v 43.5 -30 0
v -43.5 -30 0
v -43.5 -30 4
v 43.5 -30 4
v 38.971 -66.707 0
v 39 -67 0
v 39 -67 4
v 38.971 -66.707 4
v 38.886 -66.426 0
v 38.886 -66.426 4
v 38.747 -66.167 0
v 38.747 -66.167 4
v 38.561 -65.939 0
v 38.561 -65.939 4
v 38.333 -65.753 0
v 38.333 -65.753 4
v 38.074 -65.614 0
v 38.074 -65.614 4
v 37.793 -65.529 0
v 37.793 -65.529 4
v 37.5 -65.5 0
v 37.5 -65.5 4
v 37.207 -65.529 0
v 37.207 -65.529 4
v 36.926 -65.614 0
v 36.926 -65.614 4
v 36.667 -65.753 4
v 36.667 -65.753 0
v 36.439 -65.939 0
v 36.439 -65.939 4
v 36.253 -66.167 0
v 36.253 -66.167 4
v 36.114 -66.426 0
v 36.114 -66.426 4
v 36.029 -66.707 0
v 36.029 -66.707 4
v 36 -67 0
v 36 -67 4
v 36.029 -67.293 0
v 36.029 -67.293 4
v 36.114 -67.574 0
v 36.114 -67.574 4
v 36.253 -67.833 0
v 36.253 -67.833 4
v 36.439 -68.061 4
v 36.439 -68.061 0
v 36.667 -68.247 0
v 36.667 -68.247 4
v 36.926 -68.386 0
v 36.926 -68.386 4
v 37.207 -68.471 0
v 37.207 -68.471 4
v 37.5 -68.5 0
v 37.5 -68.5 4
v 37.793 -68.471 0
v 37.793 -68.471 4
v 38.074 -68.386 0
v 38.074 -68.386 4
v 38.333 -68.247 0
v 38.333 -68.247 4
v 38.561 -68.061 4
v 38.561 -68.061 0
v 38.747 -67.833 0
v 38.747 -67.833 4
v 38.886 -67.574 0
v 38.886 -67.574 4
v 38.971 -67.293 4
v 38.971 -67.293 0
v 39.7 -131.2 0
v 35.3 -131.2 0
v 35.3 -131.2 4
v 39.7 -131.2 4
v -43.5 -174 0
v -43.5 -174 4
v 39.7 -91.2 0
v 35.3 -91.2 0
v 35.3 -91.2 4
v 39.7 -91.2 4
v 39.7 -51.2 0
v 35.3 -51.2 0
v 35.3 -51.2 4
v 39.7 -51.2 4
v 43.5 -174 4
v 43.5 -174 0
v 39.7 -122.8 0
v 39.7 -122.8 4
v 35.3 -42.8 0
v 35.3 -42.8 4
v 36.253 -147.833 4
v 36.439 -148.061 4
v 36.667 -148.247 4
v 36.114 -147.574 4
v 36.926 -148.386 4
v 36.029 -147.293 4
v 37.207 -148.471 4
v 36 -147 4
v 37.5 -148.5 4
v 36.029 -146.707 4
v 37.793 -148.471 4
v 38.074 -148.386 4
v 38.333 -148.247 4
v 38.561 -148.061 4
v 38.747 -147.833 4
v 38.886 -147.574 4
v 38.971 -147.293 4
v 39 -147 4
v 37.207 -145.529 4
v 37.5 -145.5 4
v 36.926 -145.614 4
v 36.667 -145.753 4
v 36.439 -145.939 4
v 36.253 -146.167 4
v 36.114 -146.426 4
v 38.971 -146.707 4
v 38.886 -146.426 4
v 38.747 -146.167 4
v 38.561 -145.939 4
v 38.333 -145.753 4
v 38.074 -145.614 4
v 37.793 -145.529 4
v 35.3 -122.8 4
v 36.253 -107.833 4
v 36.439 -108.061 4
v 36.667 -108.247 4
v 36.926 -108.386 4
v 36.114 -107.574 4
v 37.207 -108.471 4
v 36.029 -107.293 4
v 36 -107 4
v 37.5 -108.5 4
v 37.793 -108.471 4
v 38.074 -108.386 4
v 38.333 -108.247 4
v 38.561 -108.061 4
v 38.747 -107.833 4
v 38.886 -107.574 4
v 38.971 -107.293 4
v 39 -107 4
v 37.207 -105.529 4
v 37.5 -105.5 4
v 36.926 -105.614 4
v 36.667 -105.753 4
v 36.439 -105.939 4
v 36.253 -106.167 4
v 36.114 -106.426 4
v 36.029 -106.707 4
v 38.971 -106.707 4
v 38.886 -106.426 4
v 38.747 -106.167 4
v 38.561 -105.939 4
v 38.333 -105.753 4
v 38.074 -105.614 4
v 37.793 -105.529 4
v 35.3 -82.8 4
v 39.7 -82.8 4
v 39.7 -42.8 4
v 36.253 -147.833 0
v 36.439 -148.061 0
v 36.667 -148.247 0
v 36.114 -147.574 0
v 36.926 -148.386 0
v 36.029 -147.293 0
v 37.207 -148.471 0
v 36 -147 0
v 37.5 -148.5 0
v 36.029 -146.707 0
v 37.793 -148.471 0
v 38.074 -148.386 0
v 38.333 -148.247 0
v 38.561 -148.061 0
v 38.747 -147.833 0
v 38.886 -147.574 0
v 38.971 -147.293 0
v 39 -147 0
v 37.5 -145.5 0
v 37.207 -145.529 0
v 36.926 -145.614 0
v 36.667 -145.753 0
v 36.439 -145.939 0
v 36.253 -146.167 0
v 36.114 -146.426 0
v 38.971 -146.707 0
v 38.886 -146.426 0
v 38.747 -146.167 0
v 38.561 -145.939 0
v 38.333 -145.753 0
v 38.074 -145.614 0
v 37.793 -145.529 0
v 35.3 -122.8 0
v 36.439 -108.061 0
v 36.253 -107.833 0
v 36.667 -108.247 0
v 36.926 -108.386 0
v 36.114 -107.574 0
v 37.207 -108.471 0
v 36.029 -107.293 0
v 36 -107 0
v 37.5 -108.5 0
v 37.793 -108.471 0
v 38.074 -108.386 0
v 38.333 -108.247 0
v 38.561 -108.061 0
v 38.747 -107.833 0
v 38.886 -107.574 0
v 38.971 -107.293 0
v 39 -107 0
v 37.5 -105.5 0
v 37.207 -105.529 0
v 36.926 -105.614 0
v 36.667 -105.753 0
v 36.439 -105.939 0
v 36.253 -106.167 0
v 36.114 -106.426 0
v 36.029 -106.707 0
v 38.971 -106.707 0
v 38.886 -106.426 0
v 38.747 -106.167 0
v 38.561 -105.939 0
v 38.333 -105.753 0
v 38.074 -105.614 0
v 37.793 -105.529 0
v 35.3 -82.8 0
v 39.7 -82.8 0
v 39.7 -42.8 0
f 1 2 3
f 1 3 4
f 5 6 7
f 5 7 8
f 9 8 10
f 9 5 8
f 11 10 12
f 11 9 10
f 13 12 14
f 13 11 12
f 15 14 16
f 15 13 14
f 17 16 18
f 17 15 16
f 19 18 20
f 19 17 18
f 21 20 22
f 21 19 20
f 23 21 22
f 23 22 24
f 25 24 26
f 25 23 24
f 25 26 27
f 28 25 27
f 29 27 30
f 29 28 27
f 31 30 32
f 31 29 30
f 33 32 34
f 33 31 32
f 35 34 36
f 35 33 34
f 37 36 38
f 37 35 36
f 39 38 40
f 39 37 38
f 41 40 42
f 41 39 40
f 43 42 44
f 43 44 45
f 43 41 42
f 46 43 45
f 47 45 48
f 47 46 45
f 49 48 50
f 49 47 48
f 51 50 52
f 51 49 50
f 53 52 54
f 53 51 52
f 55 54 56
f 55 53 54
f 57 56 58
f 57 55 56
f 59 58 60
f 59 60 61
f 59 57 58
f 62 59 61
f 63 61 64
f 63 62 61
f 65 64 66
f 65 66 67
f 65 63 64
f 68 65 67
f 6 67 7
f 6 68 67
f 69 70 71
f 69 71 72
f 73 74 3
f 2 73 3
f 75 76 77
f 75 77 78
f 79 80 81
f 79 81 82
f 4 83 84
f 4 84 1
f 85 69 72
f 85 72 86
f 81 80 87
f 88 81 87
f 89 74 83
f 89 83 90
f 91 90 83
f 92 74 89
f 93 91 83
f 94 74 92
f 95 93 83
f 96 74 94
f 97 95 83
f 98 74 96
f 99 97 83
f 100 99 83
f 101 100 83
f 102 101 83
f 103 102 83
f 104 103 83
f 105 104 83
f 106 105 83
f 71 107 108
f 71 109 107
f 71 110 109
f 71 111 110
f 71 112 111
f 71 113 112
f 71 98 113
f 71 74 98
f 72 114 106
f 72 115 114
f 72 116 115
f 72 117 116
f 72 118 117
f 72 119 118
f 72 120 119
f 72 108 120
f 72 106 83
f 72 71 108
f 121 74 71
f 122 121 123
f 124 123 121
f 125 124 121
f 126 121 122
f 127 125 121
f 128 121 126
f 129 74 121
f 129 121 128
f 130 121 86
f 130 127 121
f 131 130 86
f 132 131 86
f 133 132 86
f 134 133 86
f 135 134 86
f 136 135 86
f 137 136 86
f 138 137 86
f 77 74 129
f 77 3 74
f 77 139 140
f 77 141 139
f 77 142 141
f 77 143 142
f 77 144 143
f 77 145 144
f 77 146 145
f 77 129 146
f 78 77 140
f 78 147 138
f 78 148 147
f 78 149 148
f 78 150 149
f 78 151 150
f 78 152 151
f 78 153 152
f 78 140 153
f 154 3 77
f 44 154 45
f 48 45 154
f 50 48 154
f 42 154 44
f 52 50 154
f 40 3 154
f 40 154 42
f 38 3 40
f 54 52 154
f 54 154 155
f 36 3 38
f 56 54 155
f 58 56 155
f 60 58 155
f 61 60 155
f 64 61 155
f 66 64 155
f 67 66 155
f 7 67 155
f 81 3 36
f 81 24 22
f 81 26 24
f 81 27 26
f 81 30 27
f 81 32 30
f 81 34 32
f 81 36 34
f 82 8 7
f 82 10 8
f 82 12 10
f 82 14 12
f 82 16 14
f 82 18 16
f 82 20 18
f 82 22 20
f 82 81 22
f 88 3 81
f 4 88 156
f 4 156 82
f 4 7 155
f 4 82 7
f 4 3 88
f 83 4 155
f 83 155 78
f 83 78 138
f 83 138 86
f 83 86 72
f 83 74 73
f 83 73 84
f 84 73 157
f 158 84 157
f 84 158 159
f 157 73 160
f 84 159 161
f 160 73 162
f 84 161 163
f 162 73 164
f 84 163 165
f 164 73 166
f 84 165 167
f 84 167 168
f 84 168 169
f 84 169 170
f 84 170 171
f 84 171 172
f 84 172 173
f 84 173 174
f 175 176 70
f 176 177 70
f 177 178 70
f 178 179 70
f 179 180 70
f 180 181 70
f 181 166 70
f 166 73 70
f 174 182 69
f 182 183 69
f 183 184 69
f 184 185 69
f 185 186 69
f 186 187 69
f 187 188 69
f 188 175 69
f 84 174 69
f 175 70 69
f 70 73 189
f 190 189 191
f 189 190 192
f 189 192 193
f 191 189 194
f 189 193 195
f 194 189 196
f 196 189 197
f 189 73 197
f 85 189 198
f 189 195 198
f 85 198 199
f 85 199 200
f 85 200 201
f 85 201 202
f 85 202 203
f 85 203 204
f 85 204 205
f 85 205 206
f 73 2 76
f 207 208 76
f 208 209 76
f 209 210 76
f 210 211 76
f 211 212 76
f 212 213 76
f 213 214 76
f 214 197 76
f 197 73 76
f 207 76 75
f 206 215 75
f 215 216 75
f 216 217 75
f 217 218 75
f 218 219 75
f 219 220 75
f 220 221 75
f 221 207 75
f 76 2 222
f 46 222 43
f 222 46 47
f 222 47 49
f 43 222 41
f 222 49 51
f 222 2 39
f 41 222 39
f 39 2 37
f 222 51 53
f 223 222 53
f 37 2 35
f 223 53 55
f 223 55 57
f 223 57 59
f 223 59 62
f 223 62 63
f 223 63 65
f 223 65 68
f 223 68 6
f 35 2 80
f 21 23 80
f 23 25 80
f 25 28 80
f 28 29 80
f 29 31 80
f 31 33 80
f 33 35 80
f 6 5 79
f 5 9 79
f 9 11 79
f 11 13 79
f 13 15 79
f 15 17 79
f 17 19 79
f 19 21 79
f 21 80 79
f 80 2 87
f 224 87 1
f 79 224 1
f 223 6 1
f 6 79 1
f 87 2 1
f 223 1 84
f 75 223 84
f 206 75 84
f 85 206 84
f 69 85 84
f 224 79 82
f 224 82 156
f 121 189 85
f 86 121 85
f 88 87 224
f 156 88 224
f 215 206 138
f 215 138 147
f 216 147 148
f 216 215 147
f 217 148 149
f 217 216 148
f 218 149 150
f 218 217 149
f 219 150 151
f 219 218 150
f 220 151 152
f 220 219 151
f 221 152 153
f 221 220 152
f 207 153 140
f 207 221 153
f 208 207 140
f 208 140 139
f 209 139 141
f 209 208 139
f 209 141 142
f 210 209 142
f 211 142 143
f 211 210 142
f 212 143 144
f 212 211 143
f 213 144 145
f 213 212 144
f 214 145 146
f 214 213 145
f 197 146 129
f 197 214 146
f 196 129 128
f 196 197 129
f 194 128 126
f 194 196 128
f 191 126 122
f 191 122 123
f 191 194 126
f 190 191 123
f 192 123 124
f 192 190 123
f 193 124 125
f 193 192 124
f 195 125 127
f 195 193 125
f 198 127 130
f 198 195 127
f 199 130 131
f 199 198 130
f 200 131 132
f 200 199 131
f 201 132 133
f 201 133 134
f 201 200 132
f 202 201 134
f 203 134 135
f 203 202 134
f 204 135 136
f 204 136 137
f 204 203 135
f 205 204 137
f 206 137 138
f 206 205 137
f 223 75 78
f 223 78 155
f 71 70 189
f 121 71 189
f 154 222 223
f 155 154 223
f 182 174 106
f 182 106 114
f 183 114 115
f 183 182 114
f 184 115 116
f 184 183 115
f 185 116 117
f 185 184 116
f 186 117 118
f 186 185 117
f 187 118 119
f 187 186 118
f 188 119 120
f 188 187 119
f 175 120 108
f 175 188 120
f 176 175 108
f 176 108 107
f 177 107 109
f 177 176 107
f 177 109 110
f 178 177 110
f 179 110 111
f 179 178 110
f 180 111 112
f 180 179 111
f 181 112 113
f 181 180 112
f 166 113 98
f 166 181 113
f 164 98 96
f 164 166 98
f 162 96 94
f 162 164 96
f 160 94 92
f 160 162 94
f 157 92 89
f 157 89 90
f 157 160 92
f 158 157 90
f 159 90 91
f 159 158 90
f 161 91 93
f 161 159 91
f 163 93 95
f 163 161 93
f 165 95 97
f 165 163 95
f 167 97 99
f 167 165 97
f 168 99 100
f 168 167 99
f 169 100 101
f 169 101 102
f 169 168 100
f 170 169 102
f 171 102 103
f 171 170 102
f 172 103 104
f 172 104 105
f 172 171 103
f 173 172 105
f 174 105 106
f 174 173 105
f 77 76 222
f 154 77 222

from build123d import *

# Parameters (mm, degrees)
SKETCH_1_R      = 1.5
SKETCH_1_W      = 4.4
SKETCH_1_H      = 8.4
EXTRUDE_1_DEPTH = 4
SKETCH_2_W      = 87
SKETCH_2_H      = 20
EXTRUDE_2_DEPTH = 4


with BuildPart() as part:
    # 草图1 → 凸台-拉伸1 (new body)
    with BuildSketch(Plane.XY):
        Polygon((43.5, -50), (43.5, -150), (43.5, -154), (-43.5, -154), (-43.5, -150), (-43.5, -50), (-43.5, -30), (43.5, -30), align=None)
        with Locations((37.5, -147)):
            Circle(SKETCH_1_R, mode=Mode.SUBTRACT)
        with Locations((37.5, -67)):
            Circle(SKETCH_1_R, mode=Mode.SUBTRACT)
        with Locations((37.5, -107)):
            Circle(SKETCH_1_R, mode=Mode.SUBTRACT)
        with Locations((37.5, -127)):
            Rectangle(SKETCH_1_W, SKETCH_1_H, mode=Mode.SUBTRACT)
        with Locations((37.5, -87)):
            Rectangle(SKETCH_1_W, SKETCH_1_H, mode=Mode.SUBTRACT)
        with Locations((37.5, -47)):
            Rectangle(SKETCH_1_W, SKETCH_1_H, mode=Mode.SUBTRACT)
    extrude(amount=EXTRUDE_1_DEPTH)

    # 草图2 → 凸台-拉伸2 (add)
    with BuildSketch(Plane.XY.offset(4)):
        with Locations((0, -164)):
            Rectangle(SKETCH_2_W, SKETCH_2_H)
    extrude(amount=-EXTRUDE_2_DEPTH)


solid = part.part
